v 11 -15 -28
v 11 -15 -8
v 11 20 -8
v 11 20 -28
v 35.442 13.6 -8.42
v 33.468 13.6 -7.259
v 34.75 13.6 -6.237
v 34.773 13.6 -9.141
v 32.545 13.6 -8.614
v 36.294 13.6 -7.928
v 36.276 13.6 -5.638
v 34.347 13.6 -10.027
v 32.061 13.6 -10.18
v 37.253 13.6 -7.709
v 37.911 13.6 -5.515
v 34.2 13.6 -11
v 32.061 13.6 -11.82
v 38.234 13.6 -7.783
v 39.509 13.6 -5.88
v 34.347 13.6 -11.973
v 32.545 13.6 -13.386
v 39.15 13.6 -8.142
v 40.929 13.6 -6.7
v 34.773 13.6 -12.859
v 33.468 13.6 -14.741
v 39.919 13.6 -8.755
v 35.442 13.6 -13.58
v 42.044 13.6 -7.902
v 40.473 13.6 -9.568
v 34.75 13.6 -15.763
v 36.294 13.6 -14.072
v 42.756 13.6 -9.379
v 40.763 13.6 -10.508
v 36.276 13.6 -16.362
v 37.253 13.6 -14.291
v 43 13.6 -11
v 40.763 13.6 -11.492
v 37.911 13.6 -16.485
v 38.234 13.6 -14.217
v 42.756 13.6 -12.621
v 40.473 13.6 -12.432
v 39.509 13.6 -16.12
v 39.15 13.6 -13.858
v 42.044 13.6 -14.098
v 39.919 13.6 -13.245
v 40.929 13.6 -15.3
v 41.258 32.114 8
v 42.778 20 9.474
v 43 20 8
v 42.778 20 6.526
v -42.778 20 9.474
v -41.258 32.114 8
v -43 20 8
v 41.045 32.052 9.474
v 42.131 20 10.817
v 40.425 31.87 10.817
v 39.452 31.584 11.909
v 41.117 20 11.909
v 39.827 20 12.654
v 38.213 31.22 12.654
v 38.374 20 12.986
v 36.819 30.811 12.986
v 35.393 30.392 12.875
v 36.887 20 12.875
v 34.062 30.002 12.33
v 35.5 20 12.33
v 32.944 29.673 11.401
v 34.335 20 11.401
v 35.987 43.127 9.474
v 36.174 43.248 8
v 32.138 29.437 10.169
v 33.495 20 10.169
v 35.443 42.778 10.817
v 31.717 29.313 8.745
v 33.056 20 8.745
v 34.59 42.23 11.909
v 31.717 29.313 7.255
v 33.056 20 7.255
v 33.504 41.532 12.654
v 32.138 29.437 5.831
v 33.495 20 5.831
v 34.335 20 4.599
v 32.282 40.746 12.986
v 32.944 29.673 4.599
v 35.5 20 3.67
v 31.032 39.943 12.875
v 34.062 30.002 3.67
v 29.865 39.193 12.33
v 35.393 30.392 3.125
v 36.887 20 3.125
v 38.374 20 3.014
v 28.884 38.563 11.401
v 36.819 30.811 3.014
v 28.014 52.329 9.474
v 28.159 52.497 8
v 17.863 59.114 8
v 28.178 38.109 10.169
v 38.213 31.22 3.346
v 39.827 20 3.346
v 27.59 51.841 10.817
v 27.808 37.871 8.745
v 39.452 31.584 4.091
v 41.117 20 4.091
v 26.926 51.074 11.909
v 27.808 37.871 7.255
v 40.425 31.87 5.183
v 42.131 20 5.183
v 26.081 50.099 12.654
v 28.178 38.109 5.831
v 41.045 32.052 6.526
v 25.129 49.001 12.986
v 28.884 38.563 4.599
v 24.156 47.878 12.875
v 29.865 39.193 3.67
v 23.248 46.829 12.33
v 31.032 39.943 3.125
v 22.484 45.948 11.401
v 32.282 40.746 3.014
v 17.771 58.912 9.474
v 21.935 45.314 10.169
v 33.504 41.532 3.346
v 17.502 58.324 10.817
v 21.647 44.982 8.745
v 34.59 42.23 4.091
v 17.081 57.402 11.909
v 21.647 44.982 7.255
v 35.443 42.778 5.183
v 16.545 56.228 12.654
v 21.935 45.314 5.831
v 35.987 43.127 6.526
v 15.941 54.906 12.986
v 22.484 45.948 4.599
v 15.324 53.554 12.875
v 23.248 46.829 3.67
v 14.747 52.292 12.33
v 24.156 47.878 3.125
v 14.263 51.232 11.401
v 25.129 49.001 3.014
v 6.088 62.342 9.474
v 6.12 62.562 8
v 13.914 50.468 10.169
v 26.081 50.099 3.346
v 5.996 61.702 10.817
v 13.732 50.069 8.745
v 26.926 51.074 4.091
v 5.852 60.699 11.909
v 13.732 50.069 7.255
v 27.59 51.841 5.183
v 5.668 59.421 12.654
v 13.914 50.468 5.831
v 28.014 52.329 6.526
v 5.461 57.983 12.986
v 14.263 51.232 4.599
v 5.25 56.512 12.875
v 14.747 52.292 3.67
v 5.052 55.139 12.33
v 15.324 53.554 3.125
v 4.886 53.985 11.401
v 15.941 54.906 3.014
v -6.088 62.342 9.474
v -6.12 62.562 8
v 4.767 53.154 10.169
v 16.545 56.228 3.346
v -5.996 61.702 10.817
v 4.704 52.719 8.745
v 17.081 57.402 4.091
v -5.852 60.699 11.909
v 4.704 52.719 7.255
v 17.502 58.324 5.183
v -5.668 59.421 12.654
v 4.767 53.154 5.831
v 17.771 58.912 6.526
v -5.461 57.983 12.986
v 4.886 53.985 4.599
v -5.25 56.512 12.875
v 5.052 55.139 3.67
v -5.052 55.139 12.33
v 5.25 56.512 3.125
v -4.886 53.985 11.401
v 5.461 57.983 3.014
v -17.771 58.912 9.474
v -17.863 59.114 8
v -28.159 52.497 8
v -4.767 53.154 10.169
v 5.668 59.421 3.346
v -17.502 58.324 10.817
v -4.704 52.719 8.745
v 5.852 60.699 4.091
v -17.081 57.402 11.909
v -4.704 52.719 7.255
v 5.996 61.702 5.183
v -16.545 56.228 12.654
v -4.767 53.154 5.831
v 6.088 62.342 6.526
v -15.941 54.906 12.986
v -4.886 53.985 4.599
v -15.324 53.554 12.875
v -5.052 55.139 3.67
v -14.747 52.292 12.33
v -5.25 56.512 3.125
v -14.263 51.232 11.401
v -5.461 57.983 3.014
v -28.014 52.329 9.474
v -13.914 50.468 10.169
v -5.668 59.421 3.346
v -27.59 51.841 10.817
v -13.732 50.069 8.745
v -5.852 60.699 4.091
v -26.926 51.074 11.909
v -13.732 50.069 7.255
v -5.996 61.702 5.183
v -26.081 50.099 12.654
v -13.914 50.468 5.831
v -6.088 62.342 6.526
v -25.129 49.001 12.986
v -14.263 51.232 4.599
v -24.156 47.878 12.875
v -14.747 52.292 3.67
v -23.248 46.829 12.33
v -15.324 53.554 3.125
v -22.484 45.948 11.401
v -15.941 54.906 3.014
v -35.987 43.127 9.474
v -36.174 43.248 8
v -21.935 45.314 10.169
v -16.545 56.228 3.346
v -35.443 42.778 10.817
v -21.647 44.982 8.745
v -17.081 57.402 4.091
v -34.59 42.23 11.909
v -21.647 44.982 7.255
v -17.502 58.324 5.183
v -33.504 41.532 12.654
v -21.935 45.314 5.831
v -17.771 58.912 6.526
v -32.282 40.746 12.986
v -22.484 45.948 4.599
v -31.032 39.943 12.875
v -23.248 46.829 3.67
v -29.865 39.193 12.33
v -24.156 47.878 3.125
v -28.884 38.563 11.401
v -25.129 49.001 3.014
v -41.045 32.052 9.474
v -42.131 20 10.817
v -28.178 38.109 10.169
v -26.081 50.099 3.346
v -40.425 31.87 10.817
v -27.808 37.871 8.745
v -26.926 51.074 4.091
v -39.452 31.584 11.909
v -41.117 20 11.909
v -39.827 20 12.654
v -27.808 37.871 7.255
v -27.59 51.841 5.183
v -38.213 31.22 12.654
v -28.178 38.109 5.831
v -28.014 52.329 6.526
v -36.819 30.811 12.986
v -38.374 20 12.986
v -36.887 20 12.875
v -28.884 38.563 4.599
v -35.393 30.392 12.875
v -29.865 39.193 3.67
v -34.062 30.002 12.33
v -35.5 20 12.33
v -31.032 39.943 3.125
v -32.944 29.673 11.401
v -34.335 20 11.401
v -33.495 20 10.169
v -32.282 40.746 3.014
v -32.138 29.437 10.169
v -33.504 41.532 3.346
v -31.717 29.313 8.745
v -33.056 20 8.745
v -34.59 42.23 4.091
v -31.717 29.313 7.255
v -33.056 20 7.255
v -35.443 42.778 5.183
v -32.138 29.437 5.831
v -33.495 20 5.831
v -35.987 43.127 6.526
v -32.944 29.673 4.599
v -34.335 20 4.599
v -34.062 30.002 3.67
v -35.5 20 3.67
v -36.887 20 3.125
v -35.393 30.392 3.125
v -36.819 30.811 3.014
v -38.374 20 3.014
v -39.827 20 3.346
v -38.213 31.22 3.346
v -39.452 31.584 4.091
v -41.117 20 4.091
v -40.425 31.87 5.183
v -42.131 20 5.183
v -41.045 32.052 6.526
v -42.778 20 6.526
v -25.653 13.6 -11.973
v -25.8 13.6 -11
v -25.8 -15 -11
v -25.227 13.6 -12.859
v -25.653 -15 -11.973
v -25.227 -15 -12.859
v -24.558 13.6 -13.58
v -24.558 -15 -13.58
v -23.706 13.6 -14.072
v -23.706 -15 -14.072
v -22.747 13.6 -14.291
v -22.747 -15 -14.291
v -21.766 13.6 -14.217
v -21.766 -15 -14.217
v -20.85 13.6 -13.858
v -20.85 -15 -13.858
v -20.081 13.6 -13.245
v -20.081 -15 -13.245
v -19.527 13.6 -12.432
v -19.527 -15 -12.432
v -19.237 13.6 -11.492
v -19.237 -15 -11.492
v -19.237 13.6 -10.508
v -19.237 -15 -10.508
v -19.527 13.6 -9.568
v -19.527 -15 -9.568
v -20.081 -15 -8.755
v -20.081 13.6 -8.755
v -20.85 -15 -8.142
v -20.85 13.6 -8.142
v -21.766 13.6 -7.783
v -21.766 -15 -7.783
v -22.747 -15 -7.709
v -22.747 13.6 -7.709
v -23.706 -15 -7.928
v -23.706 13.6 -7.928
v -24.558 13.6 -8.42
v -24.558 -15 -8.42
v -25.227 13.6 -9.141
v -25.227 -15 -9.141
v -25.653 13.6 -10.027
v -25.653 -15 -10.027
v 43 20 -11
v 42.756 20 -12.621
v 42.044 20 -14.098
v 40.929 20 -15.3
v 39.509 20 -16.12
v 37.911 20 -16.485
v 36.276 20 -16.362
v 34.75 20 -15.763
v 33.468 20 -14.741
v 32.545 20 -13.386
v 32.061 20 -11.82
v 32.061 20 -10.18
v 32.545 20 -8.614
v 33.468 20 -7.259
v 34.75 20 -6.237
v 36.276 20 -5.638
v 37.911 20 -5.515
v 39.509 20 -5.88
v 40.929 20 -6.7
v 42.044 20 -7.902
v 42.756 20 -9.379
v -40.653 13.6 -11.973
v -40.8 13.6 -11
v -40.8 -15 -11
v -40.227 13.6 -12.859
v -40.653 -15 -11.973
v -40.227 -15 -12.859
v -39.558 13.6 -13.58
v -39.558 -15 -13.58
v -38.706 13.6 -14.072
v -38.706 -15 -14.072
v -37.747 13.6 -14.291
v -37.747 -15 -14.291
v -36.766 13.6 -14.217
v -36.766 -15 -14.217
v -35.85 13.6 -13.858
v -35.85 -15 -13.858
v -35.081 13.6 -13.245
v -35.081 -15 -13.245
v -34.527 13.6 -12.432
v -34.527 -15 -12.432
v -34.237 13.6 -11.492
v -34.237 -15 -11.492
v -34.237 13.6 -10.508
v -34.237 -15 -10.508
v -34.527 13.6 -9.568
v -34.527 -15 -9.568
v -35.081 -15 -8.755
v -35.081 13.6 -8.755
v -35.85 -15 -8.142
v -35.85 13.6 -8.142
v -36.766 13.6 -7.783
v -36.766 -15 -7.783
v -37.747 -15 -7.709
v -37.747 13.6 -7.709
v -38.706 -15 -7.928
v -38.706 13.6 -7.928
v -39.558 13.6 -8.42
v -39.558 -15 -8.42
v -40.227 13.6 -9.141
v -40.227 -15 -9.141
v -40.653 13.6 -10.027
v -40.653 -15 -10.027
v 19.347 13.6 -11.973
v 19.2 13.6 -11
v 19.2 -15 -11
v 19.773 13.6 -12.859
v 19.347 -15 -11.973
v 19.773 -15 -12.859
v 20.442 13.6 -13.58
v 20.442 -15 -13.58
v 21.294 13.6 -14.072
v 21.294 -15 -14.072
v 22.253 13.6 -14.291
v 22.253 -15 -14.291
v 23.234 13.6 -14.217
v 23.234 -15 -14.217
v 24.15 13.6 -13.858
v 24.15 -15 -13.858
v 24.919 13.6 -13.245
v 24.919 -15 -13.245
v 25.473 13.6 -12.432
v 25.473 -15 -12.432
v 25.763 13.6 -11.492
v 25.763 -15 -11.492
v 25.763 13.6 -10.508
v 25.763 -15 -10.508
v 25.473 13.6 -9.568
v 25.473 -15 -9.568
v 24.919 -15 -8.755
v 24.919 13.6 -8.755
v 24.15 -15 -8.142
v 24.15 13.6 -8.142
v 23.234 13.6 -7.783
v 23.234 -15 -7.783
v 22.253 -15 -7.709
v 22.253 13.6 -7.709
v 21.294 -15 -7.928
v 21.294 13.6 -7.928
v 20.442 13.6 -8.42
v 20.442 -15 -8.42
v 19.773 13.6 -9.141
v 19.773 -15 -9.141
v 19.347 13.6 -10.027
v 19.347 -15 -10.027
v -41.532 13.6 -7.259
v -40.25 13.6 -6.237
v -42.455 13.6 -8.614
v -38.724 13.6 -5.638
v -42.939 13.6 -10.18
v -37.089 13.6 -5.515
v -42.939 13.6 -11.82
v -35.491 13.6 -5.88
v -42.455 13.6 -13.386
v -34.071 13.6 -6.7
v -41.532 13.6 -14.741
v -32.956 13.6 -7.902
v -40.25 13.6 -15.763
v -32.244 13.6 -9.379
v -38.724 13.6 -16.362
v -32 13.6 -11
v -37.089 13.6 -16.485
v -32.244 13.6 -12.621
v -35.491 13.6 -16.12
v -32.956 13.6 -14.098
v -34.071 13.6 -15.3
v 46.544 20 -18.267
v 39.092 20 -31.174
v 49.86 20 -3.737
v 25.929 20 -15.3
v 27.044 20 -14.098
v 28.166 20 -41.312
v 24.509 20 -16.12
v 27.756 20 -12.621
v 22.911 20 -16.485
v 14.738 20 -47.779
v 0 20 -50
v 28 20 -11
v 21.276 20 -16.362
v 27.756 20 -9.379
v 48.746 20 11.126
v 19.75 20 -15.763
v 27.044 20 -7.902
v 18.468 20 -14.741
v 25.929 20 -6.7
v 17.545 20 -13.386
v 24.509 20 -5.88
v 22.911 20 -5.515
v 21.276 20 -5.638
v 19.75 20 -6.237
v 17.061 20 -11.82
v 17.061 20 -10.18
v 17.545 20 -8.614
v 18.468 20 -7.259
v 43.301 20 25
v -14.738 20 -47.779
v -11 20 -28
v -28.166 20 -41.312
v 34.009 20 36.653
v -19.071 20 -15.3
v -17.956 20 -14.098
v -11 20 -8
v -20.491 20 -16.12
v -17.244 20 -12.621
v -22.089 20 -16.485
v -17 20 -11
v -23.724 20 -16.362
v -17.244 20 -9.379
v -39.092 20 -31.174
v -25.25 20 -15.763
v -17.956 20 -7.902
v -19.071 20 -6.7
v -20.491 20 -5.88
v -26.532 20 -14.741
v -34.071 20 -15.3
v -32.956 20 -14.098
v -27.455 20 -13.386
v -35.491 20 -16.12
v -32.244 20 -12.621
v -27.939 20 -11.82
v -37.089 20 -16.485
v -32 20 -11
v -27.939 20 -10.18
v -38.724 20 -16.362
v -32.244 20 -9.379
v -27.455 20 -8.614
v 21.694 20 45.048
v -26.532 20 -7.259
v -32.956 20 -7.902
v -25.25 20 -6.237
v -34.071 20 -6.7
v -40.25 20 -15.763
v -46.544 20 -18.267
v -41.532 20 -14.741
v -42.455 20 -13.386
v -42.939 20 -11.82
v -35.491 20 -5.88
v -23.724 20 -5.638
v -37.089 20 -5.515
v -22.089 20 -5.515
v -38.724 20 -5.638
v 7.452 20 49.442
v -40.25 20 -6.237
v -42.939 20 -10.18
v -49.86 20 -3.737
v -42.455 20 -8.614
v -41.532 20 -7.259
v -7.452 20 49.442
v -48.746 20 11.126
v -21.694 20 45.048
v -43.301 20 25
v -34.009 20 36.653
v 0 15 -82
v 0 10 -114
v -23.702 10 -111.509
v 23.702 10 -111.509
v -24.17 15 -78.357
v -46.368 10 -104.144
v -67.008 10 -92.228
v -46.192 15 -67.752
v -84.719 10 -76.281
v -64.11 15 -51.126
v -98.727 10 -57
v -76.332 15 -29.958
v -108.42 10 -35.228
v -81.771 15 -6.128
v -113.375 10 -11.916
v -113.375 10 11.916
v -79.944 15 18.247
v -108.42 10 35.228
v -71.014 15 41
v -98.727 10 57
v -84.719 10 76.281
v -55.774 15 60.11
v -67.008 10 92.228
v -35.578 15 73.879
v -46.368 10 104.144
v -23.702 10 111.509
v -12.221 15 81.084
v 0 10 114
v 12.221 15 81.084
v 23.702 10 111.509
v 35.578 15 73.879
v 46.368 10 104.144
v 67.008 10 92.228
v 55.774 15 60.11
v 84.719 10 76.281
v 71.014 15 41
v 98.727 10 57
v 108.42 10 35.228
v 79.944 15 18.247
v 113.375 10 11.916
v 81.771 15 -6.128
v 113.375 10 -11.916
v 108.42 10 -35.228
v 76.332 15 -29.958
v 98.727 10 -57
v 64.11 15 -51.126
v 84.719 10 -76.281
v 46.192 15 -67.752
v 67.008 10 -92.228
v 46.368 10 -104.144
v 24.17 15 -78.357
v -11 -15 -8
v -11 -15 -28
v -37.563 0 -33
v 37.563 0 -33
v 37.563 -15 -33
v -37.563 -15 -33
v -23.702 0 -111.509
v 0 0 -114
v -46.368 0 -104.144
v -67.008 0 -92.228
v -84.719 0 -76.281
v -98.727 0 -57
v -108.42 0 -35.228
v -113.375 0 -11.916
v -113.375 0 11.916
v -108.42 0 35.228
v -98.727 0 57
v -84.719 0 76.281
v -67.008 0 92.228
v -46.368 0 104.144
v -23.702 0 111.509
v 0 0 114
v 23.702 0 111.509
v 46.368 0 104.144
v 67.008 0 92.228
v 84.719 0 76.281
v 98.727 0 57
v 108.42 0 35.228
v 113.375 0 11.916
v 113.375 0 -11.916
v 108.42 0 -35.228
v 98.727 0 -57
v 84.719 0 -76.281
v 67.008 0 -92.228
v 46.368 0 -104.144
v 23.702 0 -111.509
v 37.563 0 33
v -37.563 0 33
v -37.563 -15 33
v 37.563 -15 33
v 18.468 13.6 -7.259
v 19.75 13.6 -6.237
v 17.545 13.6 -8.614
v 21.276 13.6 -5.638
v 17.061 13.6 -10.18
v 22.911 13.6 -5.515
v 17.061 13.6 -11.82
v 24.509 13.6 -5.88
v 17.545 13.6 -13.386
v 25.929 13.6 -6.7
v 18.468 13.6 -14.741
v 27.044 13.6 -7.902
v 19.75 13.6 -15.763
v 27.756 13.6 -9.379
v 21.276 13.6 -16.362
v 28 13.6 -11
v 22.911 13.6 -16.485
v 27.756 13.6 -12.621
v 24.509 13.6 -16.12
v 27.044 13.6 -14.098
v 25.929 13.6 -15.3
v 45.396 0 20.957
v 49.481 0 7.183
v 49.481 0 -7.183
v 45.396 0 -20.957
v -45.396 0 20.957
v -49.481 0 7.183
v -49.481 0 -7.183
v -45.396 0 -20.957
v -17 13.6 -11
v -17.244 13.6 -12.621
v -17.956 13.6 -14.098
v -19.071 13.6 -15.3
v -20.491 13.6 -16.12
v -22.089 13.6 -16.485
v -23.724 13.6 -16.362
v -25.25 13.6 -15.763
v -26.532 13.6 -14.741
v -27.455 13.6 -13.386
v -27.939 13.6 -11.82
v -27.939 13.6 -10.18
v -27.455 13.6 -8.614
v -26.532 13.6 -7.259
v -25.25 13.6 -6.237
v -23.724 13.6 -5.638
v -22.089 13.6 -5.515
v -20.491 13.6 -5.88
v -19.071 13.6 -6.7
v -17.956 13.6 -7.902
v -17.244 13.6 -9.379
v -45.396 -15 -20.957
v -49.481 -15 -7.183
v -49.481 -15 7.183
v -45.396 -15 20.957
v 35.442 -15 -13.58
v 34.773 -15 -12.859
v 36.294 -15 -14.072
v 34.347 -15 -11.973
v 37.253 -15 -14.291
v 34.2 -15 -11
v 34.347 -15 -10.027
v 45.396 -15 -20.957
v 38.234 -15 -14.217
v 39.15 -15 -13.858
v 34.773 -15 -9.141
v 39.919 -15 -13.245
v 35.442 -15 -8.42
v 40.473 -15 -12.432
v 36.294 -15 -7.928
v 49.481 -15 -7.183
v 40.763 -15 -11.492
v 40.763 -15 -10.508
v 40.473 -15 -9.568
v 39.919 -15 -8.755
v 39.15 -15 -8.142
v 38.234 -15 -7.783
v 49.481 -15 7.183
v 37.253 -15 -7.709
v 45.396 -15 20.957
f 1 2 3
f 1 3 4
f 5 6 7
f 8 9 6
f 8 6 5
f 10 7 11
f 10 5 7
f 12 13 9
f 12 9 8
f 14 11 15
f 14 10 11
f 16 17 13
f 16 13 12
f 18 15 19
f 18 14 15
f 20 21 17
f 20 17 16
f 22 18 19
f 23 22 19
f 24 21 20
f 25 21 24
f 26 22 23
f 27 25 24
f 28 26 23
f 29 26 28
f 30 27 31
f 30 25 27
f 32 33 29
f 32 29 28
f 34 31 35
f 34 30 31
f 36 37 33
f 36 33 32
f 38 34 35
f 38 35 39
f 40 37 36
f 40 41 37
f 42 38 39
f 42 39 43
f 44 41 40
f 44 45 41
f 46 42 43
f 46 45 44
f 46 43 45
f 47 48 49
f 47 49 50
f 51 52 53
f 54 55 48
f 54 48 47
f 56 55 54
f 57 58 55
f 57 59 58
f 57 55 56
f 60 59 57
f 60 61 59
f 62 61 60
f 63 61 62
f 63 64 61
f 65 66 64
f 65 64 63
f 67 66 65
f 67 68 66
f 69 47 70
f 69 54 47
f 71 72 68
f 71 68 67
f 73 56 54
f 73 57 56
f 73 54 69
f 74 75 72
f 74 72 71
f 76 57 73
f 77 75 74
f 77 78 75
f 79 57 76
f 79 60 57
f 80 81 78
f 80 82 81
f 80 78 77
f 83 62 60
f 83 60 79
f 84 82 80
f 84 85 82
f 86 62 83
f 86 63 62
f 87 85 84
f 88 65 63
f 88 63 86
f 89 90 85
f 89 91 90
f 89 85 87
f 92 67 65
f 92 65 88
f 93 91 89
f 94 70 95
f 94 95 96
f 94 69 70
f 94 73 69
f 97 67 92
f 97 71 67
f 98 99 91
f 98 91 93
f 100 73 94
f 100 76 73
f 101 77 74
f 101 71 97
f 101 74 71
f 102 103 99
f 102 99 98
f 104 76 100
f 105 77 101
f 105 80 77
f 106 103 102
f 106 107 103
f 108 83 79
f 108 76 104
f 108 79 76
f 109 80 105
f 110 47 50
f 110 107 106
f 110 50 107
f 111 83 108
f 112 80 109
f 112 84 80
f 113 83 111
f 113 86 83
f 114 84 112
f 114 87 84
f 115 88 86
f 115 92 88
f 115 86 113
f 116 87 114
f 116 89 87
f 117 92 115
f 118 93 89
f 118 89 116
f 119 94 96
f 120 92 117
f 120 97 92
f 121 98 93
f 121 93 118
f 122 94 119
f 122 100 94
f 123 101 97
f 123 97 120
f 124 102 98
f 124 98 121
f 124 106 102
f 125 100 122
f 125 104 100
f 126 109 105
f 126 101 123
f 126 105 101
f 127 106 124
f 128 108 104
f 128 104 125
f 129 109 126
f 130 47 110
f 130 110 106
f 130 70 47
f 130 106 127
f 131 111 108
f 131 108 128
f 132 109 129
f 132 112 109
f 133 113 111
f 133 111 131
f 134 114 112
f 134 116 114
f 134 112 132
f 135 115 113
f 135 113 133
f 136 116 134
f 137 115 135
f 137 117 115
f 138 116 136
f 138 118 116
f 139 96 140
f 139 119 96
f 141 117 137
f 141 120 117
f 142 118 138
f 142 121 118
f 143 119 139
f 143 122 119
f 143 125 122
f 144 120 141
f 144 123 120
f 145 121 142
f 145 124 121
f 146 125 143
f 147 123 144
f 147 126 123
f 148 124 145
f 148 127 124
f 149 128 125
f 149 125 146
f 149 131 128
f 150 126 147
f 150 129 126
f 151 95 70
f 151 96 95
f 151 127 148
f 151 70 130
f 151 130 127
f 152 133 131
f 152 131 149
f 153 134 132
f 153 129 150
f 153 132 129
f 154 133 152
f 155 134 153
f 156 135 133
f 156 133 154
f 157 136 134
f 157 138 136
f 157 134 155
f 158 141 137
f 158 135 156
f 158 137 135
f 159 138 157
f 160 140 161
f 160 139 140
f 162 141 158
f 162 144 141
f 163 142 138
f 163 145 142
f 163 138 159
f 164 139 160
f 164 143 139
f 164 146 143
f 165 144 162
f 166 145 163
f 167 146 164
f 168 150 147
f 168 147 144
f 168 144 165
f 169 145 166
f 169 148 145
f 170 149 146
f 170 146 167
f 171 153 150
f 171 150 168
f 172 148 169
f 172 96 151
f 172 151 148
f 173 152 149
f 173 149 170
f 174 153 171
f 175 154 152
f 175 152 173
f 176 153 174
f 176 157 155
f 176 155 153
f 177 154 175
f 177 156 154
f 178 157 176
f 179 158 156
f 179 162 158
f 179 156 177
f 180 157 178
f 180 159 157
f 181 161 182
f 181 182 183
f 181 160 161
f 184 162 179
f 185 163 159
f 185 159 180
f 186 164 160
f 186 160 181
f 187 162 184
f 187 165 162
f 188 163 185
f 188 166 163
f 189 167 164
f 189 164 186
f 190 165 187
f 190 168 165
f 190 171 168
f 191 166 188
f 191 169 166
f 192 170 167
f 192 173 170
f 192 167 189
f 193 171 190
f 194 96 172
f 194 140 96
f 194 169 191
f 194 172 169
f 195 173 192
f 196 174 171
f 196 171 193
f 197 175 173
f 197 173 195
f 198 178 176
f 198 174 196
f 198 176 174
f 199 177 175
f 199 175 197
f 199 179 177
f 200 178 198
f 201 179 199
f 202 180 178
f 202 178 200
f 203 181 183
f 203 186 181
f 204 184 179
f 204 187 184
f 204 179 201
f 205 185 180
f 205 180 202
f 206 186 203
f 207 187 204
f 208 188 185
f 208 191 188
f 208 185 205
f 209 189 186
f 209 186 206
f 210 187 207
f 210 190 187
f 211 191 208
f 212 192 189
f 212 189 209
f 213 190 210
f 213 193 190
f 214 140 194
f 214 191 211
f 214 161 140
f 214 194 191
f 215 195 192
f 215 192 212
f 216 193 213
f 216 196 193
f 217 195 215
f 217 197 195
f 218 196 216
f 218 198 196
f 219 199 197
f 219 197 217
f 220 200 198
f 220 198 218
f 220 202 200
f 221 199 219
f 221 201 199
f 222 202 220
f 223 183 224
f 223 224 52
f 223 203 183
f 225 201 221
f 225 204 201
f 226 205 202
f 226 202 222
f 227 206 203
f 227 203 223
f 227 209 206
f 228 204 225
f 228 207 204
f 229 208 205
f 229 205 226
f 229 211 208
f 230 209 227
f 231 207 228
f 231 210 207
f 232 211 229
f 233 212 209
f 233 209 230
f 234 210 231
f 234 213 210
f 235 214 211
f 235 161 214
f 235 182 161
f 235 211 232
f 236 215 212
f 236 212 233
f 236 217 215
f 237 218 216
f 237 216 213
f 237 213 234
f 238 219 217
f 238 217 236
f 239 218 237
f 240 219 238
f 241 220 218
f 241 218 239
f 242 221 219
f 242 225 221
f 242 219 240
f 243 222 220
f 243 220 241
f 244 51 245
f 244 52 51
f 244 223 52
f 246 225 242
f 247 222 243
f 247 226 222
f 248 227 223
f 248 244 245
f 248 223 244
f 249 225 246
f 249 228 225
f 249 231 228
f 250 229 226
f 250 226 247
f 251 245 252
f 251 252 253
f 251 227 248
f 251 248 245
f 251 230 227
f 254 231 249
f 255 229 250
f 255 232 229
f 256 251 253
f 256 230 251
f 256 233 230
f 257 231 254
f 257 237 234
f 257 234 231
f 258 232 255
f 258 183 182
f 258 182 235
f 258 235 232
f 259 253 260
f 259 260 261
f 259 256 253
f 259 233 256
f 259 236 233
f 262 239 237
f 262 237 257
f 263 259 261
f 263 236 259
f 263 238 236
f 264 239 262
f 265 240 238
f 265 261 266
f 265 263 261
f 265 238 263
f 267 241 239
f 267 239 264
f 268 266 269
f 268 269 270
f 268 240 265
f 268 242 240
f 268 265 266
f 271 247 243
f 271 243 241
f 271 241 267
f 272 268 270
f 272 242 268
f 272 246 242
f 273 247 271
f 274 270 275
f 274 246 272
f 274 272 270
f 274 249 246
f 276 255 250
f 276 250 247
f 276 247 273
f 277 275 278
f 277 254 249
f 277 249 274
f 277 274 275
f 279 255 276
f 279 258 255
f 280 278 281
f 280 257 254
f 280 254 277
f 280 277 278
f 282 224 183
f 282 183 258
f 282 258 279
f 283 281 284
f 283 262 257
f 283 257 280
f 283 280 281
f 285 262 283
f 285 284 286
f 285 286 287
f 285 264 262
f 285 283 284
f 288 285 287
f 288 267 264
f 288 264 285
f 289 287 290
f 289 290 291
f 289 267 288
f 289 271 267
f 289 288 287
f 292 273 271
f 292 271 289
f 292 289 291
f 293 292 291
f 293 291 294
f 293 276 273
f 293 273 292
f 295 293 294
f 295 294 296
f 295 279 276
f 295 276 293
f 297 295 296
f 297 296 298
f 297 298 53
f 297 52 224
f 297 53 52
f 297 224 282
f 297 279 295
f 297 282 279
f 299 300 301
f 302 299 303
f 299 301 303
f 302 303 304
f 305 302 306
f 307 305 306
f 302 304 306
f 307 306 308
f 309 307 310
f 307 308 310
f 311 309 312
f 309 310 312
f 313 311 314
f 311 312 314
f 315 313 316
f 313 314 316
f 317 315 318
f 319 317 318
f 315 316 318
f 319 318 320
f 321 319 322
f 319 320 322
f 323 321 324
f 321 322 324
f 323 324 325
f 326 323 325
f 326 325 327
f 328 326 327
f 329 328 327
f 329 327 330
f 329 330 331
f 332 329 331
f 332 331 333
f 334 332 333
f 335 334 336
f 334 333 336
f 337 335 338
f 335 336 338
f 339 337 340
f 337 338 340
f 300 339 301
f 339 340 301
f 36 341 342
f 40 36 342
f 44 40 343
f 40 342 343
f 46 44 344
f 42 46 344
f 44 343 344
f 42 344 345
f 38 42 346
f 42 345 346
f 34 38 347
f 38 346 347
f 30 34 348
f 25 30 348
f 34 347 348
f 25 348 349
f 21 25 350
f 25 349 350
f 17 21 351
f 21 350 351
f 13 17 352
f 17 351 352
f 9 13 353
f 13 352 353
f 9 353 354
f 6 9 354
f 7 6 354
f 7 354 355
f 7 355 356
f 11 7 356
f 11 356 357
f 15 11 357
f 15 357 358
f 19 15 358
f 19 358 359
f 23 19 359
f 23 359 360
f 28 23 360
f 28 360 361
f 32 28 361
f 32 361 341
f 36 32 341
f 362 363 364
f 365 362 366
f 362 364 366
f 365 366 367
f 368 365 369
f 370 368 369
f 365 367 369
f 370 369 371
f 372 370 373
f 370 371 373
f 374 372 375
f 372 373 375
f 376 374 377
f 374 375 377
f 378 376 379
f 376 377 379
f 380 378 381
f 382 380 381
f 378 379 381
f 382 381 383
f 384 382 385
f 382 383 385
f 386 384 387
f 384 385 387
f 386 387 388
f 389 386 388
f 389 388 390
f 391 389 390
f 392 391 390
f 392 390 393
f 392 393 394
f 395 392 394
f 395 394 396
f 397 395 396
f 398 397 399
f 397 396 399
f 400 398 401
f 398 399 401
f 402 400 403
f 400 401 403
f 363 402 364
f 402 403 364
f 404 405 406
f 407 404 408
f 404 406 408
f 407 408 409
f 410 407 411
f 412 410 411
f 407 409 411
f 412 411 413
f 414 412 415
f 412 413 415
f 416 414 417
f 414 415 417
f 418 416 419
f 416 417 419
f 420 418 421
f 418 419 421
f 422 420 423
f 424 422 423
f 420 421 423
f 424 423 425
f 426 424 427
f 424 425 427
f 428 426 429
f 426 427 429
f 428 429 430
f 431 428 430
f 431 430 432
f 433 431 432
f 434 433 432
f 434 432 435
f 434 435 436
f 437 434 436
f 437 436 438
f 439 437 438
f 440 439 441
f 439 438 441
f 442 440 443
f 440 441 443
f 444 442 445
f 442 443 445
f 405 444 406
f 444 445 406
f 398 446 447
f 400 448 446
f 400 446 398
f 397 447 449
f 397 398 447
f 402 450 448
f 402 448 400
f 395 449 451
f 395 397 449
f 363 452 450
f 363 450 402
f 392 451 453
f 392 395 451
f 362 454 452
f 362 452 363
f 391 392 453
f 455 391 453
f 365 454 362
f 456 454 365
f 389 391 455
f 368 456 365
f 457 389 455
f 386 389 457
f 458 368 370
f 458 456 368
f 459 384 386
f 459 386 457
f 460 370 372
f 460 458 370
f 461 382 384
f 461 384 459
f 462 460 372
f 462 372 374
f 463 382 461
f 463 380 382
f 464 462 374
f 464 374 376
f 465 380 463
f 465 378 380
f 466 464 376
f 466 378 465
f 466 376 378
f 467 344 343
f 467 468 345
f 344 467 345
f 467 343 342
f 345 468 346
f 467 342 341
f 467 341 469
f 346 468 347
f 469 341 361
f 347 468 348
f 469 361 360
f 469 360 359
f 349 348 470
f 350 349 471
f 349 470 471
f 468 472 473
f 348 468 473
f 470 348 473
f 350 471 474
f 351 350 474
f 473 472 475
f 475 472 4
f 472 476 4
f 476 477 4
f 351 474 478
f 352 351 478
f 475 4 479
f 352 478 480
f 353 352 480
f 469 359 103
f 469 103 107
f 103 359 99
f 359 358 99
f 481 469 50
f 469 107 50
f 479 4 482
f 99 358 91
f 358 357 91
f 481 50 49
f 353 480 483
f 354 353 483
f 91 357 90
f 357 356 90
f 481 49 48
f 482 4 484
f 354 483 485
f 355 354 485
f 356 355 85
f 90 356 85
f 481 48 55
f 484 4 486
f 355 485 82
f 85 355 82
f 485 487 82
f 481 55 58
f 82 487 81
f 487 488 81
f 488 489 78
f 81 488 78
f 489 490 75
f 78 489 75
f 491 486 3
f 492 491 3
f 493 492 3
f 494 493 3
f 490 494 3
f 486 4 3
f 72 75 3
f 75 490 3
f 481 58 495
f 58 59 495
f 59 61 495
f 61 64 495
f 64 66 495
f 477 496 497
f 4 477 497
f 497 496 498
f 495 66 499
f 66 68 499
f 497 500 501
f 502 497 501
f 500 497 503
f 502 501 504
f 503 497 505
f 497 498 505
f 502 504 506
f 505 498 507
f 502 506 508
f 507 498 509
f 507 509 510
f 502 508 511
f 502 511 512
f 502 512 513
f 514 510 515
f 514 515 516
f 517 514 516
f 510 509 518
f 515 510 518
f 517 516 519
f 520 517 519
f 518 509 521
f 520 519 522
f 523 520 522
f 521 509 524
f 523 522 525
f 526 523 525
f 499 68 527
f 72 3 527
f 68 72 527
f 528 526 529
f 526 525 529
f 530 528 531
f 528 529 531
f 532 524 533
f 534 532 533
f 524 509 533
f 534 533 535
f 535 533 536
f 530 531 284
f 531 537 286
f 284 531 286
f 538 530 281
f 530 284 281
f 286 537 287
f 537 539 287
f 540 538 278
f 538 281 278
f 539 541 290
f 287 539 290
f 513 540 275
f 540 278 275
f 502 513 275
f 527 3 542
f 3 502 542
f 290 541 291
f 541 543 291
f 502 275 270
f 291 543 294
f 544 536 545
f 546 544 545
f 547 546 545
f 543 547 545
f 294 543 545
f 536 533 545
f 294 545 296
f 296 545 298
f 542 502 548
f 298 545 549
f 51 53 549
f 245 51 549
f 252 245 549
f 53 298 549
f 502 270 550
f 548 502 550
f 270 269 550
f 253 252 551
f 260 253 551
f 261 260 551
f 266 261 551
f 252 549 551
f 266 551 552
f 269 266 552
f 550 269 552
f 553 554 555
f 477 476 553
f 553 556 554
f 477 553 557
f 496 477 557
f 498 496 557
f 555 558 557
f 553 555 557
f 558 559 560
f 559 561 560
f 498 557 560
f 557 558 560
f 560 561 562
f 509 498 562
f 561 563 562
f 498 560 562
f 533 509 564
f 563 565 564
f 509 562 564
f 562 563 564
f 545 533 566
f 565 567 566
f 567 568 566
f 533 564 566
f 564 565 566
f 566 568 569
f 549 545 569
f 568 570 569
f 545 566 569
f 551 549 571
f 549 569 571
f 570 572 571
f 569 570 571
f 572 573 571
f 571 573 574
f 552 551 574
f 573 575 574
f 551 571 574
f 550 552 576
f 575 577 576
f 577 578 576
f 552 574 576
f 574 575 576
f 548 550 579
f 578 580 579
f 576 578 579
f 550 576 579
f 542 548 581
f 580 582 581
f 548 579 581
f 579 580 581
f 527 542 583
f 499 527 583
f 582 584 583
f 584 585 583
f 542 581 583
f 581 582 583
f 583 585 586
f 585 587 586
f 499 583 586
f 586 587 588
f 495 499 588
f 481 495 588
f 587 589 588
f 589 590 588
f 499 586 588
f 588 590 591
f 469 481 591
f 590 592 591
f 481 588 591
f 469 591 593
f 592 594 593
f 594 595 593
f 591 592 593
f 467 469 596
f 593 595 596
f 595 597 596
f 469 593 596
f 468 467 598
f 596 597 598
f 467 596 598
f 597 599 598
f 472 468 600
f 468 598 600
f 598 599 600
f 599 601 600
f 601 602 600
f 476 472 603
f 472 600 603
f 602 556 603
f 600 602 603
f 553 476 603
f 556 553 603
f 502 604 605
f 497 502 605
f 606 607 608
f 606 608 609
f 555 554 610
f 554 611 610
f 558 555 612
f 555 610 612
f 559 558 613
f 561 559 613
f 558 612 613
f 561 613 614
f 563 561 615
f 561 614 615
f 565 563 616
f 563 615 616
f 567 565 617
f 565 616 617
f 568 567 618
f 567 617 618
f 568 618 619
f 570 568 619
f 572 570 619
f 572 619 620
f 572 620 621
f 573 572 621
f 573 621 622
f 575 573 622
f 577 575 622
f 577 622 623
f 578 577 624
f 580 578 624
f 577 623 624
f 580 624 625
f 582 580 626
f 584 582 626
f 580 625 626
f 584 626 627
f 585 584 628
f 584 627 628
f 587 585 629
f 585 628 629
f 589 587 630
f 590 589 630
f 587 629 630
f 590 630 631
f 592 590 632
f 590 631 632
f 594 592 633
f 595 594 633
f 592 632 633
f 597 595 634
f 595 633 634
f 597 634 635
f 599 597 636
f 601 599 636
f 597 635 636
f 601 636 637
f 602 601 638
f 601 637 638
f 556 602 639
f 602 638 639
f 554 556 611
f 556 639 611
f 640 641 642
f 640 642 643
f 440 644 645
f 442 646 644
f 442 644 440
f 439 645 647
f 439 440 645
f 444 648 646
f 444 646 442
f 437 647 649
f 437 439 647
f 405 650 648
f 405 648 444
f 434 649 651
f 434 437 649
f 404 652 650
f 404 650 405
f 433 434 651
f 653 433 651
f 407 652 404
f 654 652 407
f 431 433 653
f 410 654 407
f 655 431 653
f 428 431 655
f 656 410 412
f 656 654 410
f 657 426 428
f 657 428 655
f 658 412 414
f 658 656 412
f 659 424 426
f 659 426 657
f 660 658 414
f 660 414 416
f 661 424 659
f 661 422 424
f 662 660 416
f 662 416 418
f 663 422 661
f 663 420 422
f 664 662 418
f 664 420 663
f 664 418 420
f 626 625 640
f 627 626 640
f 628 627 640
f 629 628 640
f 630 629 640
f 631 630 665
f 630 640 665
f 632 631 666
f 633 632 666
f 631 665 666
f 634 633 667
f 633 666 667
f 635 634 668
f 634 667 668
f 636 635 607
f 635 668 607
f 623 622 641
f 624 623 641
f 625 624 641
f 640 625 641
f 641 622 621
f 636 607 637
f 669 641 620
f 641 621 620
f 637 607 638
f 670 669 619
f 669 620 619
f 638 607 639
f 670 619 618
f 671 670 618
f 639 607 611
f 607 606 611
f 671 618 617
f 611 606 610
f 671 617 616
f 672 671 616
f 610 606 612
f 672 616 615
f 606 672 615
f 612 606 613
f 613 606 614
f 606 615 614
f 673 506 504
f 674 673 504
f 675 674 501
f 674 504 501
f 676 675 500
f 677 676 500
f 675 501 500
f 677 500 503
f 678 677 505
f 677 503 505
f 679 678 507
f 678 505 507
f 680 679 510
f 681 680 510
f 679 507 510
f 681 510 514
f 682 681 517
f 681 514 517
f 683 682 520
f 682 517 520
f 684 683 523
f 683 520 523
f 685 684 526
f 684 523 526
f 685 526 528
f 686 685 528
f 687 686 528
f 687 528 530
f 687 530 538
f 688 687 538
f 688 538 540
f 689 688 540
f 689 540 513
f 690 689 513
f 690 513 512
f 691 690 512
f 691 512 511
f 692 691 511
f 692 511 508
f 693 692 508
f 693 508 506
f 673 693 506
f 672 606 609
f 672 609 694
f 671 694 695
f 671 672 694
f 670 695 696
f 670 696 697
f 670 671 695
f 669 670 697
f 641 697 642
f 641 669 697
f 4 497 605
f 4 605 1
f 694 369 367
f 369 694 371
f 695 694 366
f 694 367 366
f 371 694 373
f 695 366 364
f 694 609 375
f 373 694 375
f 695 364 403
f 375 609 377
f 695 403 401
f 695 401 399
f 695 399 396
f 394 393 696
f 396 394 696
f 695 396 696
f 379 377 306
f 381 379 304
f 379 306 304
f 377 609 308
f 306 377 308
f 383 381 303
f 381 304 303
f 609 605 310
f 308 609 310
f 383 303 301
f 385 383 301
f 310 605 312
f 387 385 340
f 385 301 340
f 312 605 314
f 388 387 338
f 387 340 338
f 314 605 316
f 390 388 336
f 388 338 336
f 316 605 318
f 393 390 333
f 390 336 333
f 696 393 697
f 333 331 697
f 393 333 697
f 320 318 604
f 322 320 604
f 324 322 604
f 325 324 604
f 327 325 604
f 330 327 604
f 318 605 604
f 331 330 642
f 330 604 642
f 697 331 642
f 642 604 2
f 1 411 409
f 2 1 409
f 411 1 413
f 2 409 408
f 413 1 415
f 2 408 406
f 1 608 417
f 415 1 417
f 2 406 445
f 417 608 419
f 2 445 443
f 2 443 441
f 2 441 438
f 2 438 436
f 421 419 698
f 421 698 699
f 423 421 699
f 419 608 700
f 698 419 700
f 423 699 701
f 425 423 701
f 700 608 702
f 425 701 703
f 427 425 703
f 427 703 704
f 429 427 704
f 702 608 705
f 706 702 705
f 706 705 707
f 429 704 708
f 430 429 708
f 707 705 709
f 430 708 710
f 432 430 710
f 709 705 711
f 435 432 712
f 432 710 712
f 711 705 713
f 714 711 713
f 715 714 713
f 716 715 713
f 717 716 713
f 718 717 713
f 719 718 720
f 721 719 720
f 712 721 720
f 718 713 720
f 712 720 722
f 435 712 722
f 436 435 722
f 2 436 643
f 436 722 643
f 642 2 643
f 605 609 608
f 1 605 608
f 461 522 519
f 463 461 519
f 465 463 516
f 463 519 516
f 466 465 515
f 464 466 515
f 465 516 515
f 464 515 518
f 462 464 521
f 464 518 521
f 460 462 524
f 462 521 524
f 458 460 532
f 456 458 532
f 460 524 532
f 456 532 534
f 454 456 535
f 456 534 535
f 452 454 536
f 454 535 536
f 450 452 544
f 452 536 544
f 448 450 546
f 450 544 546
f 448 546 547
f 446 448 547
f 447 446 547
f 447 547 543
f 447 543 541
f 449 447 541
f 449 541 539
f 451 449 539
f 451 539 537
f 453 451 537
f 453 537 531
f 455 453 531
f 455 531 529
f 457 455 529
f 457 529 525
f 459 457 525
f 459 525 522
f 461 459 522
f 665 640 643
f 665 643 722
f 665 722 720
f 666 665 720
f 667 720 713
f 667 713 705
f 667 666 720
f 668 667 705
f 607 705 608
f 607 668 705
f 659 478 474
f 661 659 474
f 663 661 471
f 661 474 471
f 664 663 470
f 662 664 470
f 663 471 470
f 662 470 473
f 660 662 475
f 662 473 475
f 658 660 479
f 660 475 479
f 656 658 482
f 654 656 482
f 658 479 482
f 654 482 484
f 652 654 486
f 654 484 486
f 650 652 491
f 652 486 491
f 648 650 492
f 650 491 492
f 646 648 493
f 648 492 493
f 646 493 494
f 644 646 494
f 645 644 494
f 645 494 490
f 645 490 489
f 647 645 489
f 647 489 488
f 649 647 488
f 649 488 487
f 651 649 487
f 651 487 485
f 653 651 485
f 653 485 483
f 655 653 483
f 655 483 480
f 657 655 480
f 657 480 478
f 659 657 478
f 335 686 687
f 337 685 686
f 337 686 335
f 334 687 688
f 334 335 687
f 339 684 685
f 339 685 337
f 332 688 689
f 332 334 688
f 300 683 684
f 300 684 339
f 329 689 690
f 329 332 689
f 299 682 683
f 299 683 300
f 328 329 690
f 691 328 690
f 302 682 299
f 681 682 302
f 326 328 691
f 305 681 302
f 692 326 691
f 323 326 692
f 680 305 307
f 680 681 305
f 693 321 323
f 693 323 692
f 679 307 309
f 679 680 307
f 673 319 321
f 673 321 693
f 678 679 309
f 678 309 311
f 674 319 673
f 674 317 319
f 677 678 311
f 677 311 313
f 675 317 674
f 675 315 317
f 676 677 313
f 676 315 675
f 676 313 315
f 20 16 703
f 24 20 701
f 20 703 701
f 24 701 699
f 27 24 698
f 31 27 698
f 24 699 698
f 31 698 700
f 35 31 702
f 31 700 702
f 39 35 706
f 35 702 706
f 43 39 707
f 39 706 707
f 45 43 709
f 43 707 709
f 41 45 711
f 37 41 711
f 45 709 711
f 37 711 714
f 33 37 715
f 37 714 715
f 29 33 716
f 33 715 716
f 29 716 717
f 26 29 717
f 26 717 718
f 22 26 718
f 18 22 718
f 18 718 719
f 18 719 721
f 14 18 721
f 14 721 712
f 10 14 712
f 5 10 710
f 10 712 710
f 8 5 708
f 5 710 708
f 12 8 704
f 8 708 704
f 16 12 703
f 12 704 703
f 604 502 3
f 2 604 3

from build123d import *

# Parameters (mm, degrees)
SKETCH_5_R                   = 50
EXTRUDE_1_DEPTH              = 35
SKETCH_2_W                   = 22
SKETCH_2_H                   = 20
CUT_EXTRUDE_1_DEPTH          = 165.975755795
HOLE_WIZARD_M6_1_D           = 6.6
HOLE_WIZARD_M6_1_CBORE_D     = 11
HOLE_WIZARD_M6_1_CBORE_DEPTH = 6.4
CUT_EXTRUDE_START            = -15
CUT_EXTRUDE_5_DEPTH          = 15
SKETCH_7_R                   = 5


with BuildPart() as part:
    # 草圖1 → 旋轉1 (revolve)
    with BuildSketch(Plane(origin=(0, 0, 0), x_dir=(0, 0, -1), z_dir=(1, 0, 0))):
        Polygon((0, 0), (0, 20), (50, 20), (114, 10), (114, 0), align=None)
    revolve(axis=Axis((0, 0, 0), (0, 1, 0)))

    # 草圖5 → 填料-伸長1 (add)
    with BuildSketch(Plane(origin=(0, 20, 0), x_dir=(1, 0, 0), z_dir=(0, 1, 0))):
        with Locations(Location((0, 0, 0), (0, 0, 270))):
            Circle(SKETCH_5_R)
    extrude(amount=-EXTRUDE_1_DEPTH)

    # 草圖2 → 除料-伸長1 (cut, through all)
    with BuildSketch(Plane(origin=(0, 20, 0), x_dir=(1, 0, 0), z_dir=(0, 1, 0))):
        with Locations((0, 18)):
            Rectangle(SKETCH_2_W, SKETCH_2_H)
    extrude(amount=-CUT_EXTRUDE_1_DEPTH, mode=Mode.SUBTRACT)

    # M6 六角承窩頭蓋螺釘的柱孔1 (through all)
    with Locations(Plane(origin=(0, 20, 0), x_dir=(1, 0, 0), z_dir=(0, 1, 0))):
        with Locations((37.5, 11), (22.5, 11), (-22.5, 11), (-37.5, 11)):
            CounterBoreHole(HOLE_WIZARD_M6_1_D / 2, HOLE_WIZARD_M6_1_CBORE_D / 2, HOLE_WIZARD_M6_1_CBORE_DEPTH)

    # 草圖6 → 除料-伸長5 (cut)
    with BuildSketch(Plane.XZ.offset(15).offset(CUT_EXTRUDE_START)):
        with BuildLine():
            Line((-37.563279942, 33), (37.563279942, 33))
            ThreePointArc((37.563279942, 33), (0, 50), (-37.563279942, 33))
        make_face()
        with BuildLine():
            ThreePointArc((-37.563279942, -33), (0, -50), (37.563279942, -33))
            Line((37.563279942, -33), (-37.563279942, -33))
        make_face()
    extrude(amount=CUT_EXTRUDE_5_DEPTH, mode=Mode.SUBTRACT)

    # 掃出1: sweep along a path in 草圖8
    with BuildLine(Plane.XY.offset(8)) as sweep_1_path:
        ThreePointArc((37.792366216, 20), (0, 57.792366216), (-37.792366216, 20))
    # 草圖7 → 掃出1 (sweep)
    with BuildSketch(Plane(origin=(0, 20, 0), x_dir=(1, 0, 0), z_dir=(0, 1, 0))):
        with Locations((38, -8)):
            Circle(SKETCH_7_R)
    sweep(path=sweep_1_path.line)


solid = part.part
